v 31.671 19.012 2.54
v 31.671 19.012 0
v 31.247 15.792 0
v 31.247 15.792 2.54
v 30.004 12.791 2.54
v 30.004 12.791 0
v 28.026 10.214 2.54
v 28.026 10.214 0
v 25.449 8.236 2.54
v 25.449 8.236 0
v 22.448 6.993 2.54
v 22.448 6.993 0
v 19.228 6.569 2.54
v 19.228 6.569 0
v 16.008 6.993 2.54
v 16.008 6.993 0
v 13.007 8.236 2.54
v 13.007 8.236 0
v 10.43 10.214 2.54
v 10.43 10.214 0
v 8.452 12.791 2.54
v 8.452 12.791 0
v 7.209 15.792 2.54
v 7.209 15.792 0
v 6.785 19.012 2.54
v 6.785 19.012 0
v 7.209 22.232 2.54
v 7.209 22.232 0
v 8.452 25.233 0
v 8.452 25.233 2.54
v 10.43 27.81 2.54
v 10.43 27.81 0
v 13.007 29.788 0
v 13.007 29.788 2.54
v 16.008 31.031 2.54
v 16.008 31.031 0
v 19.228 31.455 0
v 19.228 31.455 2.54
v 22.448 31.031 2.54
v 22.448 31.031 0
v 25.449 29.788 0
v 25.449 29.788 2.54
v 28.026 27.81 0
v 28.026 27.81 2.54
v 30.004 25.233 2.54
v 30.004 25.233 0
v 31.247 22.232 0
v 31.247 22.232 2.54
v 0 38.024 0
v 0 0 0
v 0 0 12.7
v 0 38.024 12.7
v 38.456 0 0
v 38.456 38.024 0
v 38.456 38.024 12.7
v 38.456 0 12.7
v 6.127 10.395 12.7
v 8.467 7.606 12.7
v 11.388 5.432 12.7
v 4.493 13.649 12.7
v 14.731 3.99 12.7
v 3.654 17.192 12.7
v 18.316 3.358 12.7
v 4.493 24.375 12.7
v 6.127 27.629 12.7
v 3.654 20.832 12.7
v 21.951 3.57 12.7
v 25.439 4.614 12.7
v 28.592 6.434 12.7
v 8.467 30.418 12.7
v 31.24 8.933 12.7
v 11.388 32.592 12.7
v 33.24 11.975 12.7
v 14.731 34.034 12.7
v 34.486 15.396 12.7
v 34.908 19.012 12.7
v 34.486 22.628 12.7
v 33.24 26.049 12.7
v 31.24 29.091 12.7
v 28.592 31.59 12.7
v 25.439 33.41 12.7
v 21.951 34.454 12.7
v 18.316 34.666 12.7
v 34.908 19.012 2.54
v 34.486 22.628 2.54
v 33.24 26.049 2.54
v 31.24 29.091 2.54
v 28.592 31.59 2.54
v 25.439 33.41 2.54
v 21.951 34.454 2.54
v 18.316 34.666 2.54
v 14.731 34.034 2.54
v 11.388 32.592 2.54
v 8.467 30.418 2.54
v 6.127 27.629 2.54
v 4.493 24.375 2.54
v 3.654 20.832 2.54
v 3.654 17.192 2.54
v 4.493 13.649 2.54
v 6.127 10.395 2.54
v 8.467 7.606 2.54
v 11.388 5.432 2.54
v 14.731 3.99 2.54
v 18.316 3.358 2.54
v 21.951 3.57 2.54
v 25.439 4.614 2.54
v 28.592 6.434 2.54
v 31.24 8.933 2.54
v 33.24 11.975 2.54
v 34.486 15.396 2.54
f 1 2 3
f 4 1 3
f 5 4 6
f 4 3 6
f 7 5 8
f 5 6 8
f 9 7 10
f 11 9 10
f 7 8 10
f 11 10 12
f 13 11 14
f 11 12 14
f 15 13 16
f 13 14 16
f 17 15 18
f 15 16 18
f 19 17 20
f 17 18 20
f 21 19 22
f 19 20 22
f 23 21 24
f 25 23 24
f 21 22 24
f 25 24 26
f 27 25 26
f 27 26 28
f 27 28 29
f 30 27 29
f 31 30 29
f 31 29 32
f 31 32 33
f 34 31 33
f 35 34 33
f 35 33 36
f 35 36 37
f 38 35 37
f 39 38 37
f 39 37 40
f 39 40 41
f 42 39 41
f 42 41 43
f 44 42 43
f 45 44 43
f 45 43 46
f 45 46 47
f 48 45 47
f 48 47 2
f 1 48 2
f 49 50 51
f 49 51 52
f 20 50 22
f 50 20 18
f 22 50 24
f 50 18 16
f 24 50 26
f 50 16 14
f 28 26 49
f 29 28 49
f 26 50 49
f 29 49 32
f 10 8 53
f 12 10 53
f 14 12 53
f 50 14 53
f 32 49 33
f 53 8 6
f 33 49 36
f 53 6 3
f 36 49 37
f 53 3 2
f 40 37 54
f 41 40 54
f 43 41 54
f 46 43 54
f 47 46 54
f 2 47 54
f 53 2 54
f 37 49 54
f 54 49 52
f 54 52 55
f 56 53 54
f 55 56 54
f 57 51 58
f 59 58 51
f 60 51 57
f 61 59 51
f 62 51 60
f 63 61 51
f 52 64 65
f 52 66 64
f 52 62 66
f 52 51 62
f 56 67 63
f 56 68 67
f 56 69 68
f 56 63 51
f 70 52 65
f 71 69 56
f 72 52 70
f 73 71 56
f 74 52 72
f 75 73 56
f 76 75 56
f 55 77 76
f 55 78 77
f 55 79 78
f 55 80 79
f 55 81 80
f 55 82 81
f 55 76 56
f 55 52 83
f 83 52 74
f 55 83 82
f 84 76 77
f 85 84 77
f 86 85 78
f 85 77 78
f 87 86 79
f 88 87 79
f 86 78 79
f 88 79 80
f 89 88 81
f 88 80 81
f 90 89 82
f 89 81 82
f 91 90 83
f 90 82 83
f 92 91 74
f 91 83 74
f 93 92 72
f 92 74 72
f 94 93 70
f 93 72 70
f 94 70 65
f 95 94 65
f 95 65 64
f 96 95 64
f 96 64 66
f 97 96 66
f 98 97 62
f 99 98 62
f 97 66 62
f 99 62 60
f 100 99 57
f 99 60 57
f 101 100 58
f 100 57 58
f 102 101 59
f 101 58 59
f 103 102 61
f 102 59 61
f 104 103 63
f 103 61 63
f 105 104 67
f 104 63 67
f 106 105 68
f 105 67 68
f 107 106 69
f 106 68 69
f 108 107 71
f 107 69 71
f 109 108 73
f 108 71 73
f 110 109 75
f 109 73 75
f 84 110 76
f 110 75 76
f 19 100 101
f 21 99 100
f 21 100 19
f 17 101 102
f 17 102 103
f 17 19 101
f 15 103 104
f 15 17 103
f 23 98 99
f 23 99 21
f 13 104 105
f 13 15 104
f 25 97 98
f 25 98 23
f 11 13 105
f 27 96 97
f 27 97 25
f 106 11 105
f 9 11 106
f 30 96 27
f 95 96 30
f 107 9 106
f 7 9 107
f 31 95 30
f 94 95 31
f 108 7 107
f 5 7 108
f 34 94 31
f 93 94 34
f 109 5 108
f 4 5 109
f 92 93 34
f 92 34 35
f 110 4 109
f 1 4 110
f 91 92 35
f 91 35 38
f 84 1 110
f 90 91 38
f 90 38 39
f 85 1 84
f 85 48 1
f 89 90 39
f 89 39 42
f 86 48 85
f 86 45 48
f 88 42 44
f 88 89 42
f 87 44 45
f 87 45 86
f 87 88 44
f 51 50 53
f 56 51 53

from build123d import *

# Parameters (mm, degrees)
F0_W     = 38.4559035301
F0_H     = 38.0239486694
F1_DEPTH = 12.7
F2_R     = 15.6804316887
F5_DEPTH = 10.16
F6_R     = 12.442666724
F7_DEPTH = 12.701


# Not quite as in the source:
# - the program builds the solid bodies; features that only make, move or delete a surface that nothing else refers to are left out


with BuildPart() as f1:
    # F0 (on Top) → F1 (new body)
    with BuildSketch(Plane.XY):
        with Locations((19.2279517651, 19.0119743347)):
            Rectangle(F0_W, F0_H)
    extrude(amount=F1_DEPTH)

    # F2 (on face) → F5 (cut)
    with BuildSketch(Plane.XY.offset(12.7)):
        with Locations((19.2279517651, 19.0119743347)):
            Circle(F2_R)
    extrude(amount=-F5_DEPTH, mode=Mode.SUBTRACT)

    # F6 (on face) → F7 (cut, through all)
    with BuildSketch(Plane(origin=(0, 0, 0), x_dir=(1, 0, 0), z_dir=(0, 0, -1))):
        with Locations((19.2279517651, -19.0119743347)):
            Circle(F6_R)
    extrude(amount=-F7_DEPTH, mode=Mode.SUBTRACT)


solid = f1.part
